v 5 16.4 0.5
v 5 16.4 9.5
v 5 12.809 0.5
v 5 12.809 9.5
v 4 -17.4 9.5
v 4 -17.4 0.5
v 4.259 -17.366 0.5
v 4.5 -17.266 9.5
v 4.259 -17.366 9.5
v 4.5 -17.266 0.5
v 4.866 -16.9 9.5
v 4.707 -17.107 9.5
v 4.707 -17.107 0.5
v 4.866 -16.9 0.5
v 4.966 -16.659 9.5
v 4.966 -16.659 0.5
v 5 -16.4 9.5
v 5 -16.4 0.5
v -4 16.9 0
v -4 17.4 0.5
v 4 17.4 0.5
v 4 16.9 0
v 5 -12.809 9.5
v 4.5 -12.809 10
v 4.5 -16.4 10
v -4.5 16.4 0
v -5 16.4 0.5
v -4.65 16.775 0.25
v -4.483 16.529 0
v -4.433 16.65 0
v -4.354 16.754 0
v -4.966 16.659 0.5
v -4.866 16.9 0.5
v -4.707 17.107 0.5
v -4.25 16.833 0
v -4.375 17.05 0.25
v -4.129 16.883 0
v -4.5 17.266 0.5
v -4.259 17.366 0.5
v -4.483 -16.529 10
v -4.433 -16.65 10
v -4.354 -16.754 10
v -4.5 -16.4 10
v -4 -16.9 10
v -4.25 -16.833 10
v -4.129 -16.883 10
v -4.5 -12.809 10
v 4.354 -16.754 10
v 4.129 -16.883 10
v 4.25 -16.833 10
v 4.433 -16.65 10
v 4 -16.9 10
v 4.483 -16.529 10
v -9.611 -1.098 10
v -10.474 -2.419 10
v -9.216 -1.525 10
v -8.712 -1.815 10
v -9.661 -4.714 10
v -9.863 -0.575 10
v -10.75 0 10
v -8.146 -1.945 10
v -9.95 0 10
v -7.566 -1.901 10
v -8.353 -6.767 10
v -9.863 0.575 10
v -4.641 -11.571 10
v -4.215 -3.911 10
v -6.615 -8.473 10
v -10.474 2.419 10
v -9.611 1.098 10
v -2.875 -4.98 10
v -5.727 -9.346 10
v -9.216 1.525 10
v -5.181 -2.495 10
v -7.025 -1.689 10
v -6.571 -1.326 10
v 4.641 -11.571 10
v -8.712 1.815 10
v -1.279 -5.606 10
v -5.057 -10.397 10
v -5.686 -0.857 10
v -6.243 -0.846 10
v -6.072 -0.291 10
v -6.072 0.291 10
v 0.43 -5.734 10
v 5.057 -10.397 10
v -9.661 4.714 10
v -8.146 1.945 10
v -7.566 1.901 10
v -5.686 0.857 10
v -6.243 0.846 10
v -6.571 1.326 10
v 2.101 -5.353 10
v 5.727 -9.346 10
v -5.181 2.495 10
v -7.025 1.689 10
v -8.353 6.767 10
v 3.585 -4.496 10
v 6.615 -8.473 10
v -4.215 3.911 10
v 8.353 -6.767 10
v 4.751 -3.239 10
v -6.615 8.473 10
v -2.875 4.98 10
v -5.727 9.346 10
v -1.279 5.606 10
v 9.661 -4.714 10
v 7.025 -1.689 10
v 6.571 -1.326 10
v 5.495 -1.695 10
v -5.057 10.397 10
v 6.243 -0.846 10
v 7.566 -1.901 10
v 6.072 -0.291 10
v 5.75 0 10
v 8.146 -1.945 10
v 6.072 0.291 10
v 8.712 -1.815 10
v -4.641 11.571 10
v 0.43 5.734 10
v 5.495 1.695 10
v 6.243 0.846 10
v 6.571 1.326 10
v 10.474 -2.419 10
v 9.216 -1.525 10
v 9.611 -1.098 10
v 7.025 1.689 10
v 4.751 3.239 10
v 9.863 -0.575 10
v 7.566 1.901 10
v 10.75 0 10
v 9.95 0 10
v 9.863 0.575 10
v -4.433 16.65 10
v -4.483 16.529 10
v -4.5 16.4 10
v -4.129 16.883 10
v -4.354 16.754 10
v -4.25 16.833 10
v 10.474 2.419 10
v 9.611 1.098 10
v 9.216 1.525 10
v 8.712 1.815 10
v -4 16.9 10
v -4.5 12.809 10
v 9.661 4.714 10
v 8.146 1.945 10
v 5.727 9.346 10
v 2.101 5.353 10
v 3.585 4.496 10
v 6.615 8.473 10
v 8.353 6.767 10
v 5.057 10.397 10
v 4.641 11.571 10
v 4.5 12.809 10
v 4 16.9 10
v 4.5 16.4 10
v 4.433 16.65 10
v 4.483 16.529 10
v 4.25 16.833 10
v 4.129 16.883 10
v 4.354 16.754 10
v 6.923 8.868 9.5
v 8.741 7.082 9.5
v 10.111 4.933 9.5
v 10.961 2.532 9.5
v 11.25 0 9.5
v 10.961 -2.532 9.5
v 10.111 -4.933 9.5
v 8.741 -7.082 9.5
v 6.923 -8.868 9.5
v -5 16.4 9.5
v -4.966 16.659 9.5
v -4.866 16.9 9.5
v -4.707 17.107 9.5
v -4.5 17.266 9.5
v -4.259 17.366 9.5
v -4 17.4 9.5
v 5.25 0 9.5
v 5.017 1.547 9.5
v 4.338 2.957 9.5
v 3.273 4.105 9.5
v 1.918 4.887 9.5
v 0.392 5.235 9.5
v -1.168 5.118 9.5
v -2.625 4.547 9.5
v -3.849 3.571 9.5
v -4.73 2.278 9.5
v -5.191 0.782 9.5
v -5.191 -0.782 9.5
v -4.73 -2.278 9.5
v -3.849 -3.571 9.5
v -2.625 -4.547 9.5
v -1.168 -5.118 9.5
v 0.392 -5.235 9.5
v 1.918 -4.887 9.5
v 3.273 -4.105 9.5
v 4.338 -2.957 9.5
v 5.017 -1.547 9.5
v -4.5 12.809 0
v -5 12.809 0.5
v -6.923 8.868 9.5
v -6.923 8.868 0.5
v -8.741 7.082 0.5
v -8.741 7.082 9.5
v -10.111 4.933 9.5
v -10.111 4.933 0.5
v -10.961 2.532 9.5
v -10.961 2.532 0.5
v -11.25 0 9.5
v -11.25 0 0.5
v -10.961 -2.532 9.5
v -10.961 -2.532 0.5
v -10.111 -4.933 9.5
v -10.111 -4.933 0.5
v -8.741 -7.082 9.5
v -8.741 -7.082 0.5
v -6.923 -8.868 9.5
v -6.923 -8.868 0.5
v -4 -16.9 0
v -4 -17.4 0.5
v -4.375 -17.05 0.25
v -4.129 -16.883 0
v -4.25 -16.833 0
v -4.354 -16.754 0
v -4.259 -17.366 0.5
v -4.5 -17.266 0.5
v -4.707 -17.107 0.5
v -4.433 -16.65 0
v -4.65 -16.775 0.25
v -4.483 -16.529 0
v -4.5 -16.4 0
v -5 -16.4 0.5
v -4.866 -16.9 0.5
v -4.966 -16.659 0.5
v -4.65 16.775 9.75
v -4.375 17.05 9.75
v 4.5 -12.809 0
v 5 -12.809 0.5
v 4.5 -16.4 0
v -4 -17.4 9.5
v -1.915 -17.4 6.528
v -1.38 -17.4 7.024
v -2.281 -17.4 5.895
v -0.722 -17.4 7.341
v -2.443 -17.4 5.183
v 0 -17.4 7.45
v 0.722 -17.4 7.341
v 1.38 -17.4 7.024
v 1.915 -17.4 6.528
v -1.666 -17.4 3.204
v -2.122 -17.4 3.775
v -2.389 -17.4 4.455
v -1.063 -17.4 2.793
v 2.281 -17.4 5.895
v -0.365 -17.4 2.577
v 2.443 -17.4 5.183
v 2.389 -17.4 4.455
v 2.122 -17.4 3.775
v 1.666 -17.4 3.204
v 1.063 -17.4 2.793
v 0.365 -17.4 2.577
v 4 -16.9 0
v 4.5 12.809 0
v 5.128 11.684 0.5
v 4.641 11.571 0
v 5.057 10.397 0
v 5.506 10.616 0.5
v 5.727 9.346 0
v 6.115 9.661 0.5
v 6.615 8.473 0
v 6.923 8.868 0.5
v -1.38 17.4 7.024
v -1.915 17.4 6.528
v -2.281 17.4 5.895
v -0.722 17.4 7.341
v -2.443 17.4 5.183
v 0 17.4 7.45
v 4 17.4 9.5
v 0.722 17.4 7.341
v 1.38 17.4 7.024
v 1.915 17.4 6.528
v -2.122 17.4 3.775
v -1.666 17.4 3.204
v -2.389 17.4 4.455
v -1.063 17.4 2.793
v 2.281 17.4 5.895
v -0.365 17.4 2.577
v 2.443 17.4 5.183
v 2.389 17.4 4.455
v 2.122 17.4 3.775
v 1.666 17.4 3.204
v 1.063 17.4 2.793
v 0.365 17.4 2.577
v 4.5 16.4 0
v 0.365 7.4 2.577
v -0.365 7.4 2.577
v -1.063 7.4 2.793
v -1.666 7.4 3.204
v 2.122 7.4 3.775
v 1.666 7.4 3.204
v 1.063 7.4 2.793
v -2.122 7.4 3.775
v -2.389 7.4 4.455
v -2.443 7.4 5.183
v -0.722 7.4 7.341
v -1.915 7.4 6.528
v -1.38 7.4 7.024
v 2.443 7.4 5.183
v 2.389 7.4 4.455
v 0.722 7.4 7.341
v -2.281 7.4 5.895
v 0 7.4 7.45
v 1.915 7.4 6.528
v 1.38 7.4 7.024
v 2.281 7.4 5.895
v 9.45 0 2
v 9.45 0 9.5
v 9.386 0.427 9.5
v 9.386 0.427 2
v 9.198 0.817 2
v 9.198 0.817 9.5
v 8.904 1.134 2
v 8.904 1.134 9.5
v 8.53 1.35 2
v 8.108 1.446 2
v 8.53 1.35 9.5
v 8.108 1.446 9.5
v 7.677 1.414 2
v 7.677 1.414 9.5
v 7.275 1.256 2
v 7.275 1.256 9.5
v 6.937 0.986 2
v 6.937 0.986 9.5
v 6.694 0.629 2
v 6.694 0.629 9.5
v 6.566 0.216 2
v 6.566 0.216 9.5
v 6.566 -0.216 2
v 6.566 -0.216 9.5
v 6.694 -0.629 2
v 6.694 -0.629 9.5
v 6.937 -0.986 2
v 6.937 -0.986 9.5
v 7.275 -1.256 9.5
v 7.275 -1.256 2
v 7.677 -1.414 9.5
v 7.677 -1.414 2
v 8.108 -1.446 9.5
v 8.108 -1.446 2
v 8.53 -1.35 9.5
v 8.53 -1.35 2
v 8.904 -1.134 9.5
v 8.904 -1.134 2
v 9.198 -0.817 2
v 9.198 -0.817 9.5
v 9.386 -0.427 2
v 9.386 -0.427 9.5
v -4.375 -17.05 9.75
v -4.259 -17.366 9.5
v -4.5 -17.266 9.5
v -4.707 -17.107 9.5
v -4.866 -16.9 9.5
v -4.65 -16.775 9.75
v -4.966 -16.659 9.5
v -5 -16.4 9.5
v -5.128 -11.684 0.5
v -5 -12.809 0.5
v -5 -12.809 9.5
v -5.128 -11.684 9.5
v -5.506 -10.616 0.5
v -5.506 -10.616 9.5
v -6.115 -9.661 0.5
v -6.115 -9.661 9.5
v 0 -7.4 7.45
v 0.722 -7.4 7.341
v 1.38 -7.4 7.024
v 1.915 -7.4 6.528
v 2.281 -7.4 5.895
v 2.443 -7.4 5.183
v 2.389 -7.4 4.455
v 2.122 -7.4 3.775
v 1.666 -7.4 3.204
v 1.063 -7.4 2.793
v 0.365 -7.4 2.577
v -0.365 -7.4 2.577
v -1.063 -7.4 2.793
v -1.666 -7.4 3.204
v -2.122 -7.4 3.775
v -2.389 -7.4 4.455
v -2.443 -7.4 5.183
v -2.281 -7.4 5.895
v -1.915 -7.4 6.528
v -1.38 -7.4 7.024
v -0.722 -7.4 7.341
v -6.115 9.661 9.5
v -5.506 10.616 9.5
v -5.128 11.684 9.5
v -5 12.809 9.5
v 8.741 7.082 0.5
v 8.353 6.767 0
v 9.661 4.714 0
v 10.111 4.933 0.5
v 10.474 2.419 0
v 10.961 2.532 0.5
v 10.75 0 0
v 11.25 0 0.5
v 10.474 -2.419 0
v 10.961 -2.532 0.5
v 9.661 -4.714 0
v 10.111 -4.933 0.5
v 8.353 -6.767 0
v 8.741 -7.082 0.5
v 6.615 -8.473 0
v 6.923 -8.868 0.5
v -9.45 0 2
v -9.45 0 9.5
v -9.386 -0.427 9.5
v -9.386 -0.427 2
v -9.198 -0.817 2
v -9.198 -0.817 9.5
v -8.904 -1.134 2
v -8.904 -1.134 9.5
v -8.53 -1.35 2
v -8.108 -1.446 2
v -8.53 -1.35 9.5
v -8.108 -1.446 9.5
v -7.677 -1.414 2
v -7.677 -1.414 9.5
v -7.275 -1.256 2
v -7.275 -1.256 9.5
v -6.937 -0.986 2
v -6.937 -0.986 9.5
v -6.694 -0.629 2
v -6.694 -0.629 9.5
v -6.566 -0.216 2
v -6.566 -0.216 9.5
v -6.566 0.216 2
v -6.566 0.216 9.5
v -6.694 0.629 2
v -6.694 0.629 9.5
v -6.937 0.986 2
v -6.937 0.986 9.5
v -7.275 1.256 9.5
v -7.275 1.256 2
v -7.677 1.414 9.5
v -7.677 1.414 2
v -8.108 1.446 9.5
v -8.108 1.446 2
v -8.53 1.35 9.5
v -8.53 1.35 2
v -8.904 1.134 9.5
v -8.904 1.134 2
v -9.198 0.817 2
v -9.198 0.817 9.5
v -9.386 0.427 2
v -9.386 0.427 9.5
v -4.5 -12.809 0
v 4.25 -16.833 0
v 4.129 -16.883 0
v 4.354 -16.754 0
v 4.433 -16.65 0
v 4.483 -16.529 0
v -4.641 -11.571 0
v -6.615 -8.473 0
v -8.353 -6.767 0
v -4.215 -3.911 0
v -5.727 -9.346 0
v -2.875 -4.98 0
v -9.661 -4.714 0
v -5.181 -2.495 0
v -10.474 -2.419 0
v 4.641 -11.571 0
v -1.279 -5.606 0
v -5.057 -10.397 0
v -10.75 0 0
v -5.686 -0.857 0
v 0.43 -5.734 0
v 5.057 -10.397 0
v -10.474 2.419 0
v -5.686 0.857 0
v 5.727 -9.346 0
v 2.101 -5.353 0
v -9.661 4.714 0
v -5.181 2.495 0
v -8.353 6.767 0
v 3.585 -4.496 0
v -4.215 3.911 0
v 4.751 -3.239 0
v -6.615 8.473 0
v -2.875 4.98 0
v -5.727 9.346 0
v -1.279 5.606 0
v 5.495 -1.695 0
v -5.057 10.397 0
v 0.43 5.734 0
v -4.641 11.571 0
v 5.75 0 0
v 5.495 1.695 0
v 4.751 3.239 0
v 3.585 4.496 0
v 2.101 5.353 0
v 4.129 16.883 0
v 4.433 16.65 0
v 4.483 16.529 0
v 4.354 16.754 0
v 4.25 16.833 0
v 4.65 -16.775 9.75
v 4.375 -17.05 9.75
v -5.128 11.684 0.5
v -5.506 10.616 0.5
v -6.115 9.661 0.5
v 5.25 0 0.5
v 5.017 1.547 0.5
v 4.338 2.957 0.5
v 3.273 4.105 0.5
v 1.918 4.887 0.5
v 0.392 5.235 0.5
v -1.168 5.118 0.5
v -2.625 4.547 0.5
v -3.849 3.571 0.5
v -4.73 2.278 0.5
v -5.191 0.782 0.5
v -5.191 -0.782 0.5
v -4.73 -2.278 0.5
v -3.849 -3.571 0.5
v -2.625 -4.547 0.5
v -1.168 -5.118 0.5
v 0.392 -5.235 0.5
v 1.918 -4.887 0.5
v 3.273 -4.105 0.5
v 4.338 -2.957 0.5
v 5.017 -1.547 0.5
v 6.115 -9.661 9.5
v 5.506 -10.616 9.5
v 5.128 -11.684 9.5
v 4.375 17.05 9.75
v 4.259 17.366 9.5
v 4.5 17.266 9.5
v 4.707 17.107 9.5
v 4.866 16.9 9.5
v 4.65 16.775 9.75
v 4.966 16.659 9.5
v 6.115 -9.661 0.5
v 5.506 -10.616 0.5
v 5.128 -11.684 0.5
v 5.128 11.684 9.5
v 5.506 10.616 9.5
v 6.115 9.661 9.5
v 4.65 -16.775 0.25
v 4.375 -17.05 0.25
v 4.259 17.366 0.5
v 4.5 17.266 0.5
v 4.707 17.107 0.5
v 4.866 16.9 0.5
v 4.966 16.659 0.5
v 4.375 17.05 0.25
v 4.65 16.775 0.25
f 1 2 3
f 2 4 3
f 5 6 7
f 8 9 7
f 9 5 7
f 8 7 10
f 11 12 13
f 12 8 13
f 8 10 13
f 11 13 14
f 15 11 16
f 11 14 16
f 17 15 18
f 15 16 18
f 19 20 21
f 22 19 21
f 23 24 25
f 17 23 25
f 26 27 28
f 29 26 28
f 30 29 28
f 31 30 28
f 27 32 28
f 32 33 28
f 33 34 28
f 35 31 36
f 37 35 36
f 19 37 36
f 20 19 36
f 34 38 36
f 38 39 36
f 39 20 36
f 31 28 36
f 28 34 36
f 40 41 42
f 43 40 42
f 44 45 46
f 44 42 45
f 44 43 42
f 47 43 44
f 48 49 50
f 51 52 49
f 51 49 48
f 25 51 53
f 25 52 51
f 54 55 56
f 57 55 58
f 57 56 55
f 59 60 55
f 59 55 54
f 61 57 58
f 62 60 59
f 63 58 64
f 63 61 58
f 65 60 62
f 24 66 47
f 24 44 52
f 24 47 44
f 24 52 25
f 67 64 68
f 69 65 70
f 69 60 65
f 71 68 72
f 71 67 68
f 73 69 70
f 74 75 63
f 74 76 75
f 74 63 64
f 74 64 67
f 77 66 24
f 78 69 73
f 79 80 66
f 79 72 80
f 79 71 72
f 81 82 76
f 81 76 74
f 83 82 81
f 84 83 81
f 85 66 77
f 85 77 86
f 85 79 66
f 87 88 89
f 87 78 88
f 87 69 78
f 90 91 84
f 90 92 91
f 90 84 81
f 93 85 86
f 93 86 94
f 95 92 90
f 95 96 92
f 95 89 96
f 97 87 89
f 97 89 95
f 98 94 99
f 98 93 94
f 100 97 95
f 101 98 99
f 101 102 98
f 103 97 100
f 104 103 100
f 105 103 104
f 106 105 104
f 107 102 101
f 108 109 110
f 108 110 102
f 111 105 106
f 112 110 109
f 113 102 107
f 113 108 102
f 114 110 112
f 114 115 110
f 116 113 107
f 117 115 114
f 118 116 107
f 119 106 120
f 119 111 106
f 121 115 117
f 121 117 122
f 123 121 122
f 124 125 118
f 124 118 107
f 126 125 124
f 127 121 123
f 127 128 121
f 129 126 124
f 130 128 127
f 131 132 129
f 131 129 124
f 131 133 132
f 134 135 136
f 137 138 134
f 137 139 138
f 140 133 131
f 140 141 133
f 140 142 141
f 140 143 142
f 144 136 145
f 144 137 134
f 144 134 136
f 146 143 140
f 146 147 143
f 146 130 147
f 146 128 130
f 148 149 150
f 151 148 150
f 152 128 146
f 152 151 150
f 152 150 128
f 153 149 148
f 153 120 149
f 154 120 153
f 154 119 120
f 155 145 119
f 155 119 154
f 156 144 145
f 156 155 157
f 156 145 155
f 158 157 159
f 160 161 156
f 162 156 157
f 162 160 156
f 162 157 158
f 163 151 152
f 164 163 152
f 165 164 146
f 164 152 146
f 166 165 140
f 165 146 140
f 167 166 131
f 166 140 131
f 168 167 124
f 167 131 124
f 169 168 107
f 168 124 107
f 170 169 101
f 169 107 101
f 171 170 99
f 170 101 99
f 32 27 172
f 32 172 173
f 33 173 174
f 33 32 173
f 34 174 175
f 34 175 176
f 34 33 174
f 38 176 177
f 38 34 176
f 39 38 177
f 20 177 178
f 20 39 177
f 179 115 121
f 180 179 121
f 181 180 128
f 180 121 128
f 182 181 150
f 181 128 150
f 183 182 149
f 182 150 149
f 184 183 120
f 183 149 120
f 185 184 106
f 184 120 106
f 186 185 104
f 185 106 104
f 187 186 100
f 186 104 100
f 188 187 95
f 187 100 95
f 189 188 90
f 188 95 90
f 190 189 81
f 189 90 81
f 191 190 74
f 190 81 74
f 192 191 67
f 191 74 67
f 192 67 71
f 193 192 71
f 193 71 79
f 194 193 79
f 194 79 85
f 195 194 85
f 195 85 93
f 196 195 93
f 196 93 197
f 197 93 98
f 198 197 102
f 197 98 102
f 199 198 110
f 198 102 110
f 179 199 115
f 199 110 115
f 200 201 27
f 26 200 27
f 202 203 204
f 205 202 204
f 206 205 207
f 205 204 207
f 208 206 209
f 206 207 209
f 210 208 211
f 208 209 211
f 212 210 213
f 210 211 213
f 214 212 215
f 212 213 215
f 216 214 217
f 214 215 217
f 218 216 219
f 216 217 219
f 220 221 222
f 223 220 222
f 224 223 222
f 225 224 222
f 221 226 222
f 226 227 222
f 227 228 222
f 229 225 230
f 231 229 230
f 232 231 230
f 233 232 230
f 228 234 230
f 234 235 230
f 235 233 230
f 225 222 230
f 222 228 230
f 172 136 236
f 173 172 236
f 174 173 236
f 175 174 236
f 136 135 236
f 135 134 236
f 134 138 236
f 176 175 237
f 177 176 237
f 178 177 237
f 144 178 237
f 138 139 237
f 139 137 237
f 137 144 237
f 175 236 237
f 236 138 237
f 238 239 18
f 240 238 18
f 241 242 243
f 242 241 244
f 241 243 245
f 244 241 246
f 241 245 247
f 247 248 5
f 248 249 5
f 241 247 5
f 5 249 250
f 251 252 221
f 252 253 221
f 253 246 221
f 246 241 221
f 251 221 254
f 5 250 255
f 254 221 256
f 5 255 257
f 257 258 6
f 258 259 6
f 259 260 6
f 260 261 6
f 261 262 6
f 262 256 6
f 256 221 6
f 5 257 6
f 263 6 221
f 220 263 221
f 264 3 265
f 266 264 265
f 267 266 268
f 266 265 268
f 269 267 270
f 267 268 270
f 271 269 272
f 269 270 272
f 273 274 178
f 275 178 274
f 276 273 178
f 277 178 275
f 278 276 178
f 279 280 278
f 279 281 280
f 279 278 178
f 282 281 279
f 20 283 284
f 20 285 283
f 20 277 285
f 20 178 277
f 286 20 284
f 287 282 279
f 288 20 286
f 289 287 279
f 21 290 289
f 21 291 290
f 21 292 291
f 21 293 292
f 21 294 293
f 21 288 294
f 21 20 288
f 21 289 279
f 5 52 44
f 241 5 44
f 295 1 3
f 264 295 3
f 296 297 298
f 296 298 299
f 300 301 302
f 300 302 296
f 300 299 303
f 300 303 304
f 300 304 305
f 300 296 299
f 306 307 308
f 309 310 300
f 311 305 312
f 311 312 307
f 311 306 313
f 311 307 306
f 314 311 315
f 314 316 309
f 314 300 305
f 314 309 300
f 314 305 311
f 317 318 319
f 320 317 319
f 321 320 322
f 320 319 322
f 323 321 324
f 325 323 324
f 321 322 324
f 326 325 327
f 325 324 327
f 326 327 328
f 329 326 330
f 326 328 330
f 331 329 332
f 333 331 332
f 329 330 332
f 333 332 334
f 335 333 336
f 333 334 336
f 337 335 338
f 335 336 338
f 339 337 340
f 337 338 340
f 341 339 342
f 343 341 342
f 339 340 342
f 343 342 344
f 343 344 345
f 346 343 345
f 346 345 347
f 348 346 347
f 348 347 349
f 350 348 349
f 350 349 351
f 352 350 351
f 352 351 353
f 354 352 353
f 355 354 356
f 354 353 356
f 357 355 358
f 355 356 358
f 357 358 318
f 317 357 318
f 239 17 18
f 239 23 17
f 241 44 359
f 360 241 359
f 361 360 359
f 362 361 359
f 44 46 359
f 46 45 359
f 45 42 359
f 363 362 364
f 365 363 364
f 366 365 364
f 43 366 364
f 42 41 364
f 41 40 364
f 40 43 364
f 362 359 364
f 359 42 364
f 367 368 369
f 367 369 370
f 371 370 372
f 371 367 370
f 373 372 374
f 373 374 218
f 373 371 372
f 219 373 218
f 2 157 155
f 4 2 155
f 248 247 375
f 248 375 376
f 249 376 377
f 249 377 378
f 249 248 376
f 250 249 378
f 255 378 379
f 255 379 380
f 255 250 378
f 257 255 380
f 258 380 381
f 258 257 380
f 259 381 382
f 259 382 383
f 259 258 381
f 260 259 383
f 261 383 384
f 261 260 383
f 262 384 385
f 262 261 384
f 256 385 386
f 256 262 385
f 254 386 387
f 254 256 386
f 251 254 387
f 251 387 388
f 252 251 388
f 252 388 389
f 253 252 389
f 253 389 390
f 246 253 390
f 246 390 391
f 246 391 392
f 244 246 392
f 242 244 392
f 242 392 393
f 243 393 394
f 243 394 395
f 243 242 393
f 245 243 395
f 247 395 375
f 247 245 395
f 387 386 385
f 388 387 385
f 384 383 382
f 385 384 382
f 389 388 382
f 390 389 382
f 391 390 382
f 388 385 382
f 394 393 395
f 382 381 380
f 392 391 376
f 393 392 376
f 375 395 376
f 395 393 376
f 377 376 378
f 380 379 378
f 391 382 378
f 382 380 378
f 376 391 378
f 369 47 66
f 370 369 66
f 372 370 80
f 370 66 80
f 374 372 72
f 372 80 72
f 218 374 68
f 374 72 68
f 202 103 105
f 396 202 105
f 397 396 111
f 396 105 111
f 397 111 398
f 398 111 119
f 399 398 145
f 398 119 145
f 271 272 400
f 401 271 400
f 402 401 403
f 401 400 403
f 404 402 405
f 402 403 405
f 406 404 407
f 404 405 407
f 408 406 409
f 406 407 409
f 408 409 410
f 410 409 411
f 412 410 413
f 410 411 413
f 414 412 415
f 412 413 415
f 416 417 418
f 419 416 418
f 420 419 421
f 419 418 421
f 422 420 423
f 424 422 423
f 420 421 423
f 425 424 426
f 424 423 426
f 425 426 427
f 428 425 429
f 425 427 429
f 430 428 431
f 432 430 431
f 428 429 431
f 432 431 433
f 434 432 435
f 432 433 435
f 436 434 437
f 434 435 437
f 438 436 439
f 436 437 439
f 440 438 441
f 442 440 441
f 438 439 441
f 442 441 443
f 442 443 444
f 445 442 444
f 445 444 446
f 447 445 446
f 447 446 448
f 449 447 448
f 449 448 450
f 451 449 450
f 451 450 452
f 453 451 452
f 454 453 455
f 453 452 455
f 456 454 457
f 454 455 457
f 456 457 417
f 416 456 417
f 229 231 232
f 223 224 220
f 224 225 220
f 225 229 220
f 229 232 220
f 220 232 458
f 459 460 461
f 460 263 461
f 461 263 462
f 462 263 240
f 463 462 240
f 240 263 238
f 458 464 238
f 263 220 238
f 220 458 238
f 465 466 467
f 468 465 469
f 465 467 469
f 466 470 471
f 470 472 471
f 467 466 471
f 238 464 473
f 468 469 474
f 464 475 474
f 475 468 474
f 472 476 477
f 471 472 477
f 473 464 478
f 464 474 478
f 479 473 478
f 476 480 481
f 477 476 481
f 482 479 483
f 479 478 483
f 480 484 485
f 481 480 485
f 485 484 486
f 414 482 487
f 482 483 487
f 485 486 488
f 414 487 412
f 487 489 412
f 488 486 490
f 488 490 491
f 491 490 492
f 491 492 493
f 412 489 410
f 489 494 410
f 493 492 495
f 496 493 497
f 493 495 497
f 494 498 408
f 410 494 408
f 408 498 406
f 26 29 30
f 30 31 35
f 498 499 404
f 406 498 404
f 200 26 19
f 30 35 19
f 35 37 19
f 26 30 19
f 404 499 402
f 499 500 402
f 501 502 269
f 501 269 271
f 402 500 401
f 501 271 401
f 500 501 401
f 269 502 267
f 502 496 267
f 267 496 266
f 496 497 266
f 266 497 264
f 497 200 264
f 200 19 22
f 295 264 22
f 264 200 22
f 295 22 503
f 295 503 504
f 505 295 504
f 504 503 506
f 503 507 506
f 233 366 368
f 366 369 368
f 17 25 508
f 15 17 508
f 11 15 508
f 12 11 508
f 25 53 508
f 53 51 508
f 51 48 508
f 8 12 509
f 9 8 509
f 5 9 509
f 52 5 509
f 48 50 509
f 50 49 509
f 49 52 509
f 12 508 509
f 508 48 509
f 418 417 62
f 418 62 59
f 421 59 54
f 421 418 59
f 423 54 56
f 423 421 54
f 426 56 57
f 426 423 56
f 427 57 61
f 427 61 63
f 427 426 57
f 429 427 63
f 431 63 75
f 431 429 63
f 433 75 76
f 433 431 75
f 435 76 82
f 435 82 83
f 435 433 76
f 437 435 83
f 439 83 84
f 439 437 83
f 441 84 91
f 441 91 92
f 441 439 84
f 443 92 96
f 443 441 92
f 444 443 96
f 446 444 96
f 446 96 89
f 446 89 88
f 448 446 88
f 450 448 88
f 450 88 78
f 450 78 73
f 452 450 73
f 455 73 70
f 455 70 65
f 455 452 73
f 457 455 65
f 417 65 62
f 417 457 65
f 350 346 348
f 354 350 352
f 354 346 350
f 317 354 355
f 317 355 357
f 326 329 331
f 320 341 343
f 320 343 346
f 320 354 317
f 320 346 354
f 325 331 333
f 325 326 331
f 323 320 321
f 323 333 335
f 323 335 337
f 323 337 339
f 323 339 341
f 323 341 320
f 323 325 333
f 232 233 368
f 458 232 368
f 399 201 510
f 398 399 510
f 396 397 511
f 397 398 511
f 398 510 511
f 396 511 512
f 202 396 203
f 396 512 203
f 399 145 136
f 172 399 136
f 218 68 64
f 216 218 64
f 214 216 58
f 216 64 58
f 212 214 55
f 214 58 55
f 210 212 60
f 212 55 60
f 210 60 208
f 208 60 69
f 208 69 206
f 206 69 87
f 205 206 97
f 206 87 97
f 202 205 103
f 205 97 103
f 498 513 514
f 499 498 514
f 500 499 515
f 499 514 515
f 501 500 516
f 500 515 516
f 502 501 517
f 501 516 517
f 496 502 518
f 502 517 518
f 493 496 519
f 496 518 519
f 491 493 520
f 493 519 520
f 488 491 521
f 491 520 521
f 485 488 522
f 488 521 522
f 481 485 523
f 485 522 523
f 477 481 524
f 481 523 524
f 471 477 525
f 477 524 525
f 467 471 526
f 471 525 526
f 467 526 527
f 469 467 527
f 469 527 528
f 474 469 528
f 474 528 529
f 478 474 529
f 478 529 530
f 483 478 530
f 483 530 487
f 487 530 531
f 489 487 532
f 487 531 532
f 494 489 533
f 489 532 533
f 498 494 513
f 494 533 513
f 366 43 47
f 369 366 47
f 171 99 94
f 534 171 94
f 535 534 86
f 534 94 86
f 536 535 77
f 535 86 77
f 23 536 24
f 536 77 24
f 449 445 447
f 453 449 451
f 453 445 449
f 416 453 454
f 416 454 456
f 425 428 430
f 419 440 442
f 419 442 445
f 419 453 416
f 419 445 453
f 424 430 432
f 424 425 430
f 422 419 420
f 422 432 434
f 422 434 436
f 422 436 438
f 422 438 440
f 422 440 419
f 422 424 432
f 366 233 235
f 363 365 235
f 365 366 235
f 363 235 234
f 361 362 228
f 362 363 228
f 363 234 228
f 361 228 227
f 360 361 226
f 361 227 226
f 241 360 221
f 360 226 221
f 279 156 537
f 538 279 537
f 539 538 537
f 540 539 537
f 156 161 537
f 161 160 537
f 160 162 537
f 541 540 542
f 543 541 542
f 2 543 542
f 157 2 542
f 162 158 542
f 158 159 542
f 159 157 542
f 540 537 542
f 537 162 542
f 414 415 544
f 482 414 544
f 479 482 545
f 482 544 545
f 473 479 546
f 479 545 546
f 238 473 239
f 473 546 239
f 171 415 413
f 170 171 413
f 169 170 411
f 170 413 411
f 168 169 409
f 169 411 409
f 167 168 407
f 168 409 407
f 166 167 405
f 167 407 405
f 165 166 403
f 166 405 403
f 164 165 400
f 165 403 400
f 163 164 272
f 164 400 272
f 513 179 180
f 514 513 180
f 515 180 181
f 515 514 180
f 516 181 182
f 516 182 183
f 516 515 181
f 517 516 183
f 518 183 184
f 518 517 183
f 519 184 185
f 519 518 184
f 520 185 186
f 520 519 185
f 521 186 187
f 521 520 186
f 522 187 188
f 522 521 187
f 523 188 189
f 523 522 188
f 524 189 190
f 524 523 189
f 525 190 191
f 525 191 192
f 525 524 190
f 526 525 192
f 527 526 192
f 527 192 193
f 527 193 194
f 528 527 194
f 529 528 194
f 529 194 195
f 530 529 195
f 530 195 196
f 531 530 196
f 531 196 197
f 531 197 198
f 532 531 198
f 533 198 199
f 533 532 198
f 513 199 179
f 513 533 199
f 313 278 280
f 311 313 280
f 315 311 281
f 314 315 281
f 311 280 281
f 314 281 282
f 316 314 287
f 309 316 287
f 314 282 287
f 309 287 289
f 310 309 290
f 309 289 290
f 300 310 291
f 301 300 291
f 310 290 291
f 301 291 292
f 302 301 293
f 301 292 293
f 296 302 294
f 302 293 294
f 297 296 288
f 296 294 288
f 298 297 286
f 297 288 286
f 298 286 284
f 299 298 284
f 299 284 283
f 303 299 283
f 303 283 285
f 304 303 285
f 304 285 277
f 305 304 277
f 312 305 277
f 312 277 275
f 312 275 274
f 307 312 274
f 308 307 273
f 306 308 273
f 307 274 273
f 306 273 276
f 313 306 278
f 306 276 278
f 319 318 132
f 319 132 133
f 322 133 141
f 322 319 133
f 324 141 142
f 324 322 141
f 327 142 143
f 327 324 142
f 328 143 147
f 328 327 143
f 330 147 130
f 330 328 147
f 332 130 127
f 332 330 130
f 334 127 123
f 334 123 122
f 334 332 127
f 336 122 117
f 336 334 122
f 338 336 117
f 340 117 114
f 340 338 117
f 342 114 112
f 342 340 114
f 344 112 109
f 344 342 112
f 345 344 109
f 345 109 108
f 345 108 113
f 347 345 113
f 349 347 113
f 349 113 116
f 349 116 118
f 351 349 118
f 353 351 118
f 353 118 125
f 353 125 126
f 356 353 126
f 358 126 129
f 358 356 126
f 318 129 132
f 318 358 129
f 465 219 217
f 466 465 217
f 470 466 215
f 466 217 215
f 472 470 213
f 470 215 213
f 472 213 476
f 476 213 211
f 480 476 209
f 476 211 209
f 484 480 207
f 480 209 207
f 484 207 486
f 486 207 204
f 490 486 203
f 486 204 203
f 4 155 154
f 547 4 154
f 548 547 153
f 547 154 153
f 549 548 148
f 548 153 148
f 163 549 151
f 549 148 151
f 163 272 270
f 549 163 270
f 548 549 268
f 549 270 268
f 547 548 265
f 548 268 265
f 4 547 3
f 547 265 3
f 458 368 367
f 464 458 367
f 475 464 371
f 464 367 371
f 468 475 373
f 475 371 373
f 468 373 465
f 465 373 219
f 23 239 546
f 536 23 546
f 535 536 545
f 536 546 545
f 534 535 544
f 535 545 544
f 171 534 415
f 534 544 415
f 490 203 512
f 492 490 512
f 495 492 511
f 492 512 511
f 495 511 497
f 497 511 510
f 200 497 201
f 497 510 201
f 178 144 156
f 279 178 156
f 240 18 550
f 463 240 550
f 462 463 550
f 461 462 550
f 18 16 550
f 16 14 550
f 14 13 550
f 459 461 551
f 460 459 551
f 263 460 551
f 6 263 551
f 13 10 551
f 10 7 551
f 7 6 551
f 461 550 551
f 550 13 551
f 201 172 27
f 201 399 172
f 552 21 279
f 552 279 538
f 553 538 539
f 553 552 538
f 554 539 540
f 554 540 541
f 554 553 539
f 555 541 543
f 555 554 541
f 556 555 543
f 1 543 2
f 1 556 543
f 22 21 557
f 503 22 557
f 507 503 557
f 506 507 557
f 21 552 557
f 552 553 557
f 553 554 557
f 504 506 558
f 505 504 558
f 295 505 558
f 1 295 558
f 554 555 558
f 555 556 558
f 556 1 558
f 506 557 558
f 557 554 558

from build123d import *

# Parameters (mm, degrees)
SKIZZE1_R                       = 11.25
SKIZZE1_R_2                     = 5.25
AUFSATZ_LINEAR_AUSTRAGEN1_DEPTH = 10
AUFSATZ_LINEAR_START            = 6
SKIZZE2_W                       = 10
SKIZZE2_H                       = 10
AUFSATZ_LINEAR_AUSTRAGEN2_DEPTH = 11.4
SKIZZE3_R                       = 2.45
SCHNITT_LINEAR_AUSTRAGEN1_DEPTH = 10
SKIZZE4_R                       = 1.45
SCHNITT_LINEAR_AUSTRAGEN2_DEPTH = 8
VERRUNDUNG2_R                   = 5
VERRUNDUNG1_R                   = 1
FASE1_SIZE                      = 0.5


with BuildPart() as part:
    # Skizze1 → Aufsatz-Linear austragen1 (new body)
    with BuildSketch(Plane.XY):
        Circle(SKIZZE1_R)
        Circle(SKIZZE1_R_2, mode=Mode.SUBTRACT)
    extrude(amount=AUFSATZ_LINEAR_AUSTRAGEN1_DEPTH)

    # Skizze2 → Aufsatz-Linear austragen2 (add)
    with BuildSketch(Plane(origin=(0, 0, 0), x_dir=(1, 0, 0), z_dir=(0, 1, 0)).offset(AUFSATZ_LINEAR_START)):
        with Locations((0, -5)):
            Rectangle(SKIZZE2_W, SKIZZE2_H)
    aufsatz_linear_austragen2 = extrude(amount=AUFSATZ_LINEAR_AUSTRAGEN2_DEPTH)

    # Skizze3 → Schnitt-Linear austragen1 (cut)
    with BuildSketch(Plane(origin=(0, 17.4, 0), x_dir=(1, 0, 0), z_dir=(0, 1, 0))):
        with Locations(Location((0, -5, 0), (0, 0, 270))):
            Circle(SKIZZE3_R)
    schnitt_linear_austragen1 = extrude(amount=-SCHNITT_LINEAR_AUSTRAGEN1_DEPTH, mode=Mode.SUBTRACT)

    # Spiegeln1: Aufsatz-Linear austragen2, Schnitt-Linear austragen1 across plane
    add(aufsatz_linear_austragen2.mirror(Plane.ZX))
    add(schnitt_linear_austragen1.mirror(Plane.ZX), mode=Mode.SUBTRACT)

    # Skizze4 → Schnitt-Linear austragen2 (cut)
    with BuildSketch(Plane.XY.offset(10)):
        with Locations((8, 0)):
            Circle(SKIZZE4_R)
        with Locations(Location((-8, 0, 0), (0, 0, 180))):
            Circle(SKIZZE4_R)
    extrude(amount=-SCHNITT_LINEAR_AUSTRAGEN2_DEPTH, mode=Mode.SUBTRACT)

    # Verrundung2
    verrundung2_edges = [part.edges().sort_by_distance(p)[0] for p in [
        (-5, 10.077822185, 5),
        (5, 10.077822185, 5),
        (5, -10.077822185, 5),
        (-5, -10.077822185, 5),
    ]]
    fillet(verrundung2_edges, radius=VERRUNDUNG2_R)

    # Verrundung1
    verrundung1_edges = [part.edges().sort_by_distance(p)[0] for p in [
        (5, 17.4, 5),
        (-5, 17.4, 5),
        (5, -17.4, 5),
        (-5, -17.4, 5),
    ]]
    fillet(verrundung1_edges, radius=VERRUNDUNG1_R)

    # Fase1
    fase1_edges = [part.edges().sort_by_distance(p)[0] for p in [
        (-5, 14.604344229, 10),
        (-5, -14.604344229, 10),
        (0, -17.4, 10),
        (5, -14.604344229, 10),
        (5, 14.604344229, 10),
        (-4.707106781, -17.107106781, 10),
        (4.707106781, -17.107106781, 10),
        (4.707106781, 17.107106781, 10),
        (-4.707106781, 17.107106781, 10),
        (-5, 14.604344229, 0),
        (5, -14.604344229, 0),
        (0, -17.4, 0),
        (-5, -14.604344229, 0),
        (5, 14.604344229, 0),
        (-4.707106781, -17.107106781, 0),
        (4.707106781, -17.107106781, 0),
        (4.707106781, 17.107106781, 0),
        (-4.707106781, 17.107106781, 0),
        (-5.25, 0, 0),
        (-5.25, 0, 10),
        (6.55, 0, 10),
        (-6.55, 0, 10),
        (-11.25, 0, 0),
        (-11.25, 0, 10),
        (11.25, 0, 10),
        (11.25, 0, 0),
        (-5.506414829, -10.616043409, 10),
        (-5.506414829, -10.616043409, 0),
        (-5.506414829, 10.616043409, 10),
        (-5.506414829, 10.616043409, 0),
        (5.506414829, 10.616043409, 0),
        (5.506414829, 10.616043409, 10),
        (5.506414829, -10.616043409, 0),
        (5.506414829, -10.616043409, 10),
        (0, 17.4, 0),
        (0, 17.4, 10),
    ]]
    chamfer(fase1_edges, length=FASE1_SIZE)


solid = part.part
